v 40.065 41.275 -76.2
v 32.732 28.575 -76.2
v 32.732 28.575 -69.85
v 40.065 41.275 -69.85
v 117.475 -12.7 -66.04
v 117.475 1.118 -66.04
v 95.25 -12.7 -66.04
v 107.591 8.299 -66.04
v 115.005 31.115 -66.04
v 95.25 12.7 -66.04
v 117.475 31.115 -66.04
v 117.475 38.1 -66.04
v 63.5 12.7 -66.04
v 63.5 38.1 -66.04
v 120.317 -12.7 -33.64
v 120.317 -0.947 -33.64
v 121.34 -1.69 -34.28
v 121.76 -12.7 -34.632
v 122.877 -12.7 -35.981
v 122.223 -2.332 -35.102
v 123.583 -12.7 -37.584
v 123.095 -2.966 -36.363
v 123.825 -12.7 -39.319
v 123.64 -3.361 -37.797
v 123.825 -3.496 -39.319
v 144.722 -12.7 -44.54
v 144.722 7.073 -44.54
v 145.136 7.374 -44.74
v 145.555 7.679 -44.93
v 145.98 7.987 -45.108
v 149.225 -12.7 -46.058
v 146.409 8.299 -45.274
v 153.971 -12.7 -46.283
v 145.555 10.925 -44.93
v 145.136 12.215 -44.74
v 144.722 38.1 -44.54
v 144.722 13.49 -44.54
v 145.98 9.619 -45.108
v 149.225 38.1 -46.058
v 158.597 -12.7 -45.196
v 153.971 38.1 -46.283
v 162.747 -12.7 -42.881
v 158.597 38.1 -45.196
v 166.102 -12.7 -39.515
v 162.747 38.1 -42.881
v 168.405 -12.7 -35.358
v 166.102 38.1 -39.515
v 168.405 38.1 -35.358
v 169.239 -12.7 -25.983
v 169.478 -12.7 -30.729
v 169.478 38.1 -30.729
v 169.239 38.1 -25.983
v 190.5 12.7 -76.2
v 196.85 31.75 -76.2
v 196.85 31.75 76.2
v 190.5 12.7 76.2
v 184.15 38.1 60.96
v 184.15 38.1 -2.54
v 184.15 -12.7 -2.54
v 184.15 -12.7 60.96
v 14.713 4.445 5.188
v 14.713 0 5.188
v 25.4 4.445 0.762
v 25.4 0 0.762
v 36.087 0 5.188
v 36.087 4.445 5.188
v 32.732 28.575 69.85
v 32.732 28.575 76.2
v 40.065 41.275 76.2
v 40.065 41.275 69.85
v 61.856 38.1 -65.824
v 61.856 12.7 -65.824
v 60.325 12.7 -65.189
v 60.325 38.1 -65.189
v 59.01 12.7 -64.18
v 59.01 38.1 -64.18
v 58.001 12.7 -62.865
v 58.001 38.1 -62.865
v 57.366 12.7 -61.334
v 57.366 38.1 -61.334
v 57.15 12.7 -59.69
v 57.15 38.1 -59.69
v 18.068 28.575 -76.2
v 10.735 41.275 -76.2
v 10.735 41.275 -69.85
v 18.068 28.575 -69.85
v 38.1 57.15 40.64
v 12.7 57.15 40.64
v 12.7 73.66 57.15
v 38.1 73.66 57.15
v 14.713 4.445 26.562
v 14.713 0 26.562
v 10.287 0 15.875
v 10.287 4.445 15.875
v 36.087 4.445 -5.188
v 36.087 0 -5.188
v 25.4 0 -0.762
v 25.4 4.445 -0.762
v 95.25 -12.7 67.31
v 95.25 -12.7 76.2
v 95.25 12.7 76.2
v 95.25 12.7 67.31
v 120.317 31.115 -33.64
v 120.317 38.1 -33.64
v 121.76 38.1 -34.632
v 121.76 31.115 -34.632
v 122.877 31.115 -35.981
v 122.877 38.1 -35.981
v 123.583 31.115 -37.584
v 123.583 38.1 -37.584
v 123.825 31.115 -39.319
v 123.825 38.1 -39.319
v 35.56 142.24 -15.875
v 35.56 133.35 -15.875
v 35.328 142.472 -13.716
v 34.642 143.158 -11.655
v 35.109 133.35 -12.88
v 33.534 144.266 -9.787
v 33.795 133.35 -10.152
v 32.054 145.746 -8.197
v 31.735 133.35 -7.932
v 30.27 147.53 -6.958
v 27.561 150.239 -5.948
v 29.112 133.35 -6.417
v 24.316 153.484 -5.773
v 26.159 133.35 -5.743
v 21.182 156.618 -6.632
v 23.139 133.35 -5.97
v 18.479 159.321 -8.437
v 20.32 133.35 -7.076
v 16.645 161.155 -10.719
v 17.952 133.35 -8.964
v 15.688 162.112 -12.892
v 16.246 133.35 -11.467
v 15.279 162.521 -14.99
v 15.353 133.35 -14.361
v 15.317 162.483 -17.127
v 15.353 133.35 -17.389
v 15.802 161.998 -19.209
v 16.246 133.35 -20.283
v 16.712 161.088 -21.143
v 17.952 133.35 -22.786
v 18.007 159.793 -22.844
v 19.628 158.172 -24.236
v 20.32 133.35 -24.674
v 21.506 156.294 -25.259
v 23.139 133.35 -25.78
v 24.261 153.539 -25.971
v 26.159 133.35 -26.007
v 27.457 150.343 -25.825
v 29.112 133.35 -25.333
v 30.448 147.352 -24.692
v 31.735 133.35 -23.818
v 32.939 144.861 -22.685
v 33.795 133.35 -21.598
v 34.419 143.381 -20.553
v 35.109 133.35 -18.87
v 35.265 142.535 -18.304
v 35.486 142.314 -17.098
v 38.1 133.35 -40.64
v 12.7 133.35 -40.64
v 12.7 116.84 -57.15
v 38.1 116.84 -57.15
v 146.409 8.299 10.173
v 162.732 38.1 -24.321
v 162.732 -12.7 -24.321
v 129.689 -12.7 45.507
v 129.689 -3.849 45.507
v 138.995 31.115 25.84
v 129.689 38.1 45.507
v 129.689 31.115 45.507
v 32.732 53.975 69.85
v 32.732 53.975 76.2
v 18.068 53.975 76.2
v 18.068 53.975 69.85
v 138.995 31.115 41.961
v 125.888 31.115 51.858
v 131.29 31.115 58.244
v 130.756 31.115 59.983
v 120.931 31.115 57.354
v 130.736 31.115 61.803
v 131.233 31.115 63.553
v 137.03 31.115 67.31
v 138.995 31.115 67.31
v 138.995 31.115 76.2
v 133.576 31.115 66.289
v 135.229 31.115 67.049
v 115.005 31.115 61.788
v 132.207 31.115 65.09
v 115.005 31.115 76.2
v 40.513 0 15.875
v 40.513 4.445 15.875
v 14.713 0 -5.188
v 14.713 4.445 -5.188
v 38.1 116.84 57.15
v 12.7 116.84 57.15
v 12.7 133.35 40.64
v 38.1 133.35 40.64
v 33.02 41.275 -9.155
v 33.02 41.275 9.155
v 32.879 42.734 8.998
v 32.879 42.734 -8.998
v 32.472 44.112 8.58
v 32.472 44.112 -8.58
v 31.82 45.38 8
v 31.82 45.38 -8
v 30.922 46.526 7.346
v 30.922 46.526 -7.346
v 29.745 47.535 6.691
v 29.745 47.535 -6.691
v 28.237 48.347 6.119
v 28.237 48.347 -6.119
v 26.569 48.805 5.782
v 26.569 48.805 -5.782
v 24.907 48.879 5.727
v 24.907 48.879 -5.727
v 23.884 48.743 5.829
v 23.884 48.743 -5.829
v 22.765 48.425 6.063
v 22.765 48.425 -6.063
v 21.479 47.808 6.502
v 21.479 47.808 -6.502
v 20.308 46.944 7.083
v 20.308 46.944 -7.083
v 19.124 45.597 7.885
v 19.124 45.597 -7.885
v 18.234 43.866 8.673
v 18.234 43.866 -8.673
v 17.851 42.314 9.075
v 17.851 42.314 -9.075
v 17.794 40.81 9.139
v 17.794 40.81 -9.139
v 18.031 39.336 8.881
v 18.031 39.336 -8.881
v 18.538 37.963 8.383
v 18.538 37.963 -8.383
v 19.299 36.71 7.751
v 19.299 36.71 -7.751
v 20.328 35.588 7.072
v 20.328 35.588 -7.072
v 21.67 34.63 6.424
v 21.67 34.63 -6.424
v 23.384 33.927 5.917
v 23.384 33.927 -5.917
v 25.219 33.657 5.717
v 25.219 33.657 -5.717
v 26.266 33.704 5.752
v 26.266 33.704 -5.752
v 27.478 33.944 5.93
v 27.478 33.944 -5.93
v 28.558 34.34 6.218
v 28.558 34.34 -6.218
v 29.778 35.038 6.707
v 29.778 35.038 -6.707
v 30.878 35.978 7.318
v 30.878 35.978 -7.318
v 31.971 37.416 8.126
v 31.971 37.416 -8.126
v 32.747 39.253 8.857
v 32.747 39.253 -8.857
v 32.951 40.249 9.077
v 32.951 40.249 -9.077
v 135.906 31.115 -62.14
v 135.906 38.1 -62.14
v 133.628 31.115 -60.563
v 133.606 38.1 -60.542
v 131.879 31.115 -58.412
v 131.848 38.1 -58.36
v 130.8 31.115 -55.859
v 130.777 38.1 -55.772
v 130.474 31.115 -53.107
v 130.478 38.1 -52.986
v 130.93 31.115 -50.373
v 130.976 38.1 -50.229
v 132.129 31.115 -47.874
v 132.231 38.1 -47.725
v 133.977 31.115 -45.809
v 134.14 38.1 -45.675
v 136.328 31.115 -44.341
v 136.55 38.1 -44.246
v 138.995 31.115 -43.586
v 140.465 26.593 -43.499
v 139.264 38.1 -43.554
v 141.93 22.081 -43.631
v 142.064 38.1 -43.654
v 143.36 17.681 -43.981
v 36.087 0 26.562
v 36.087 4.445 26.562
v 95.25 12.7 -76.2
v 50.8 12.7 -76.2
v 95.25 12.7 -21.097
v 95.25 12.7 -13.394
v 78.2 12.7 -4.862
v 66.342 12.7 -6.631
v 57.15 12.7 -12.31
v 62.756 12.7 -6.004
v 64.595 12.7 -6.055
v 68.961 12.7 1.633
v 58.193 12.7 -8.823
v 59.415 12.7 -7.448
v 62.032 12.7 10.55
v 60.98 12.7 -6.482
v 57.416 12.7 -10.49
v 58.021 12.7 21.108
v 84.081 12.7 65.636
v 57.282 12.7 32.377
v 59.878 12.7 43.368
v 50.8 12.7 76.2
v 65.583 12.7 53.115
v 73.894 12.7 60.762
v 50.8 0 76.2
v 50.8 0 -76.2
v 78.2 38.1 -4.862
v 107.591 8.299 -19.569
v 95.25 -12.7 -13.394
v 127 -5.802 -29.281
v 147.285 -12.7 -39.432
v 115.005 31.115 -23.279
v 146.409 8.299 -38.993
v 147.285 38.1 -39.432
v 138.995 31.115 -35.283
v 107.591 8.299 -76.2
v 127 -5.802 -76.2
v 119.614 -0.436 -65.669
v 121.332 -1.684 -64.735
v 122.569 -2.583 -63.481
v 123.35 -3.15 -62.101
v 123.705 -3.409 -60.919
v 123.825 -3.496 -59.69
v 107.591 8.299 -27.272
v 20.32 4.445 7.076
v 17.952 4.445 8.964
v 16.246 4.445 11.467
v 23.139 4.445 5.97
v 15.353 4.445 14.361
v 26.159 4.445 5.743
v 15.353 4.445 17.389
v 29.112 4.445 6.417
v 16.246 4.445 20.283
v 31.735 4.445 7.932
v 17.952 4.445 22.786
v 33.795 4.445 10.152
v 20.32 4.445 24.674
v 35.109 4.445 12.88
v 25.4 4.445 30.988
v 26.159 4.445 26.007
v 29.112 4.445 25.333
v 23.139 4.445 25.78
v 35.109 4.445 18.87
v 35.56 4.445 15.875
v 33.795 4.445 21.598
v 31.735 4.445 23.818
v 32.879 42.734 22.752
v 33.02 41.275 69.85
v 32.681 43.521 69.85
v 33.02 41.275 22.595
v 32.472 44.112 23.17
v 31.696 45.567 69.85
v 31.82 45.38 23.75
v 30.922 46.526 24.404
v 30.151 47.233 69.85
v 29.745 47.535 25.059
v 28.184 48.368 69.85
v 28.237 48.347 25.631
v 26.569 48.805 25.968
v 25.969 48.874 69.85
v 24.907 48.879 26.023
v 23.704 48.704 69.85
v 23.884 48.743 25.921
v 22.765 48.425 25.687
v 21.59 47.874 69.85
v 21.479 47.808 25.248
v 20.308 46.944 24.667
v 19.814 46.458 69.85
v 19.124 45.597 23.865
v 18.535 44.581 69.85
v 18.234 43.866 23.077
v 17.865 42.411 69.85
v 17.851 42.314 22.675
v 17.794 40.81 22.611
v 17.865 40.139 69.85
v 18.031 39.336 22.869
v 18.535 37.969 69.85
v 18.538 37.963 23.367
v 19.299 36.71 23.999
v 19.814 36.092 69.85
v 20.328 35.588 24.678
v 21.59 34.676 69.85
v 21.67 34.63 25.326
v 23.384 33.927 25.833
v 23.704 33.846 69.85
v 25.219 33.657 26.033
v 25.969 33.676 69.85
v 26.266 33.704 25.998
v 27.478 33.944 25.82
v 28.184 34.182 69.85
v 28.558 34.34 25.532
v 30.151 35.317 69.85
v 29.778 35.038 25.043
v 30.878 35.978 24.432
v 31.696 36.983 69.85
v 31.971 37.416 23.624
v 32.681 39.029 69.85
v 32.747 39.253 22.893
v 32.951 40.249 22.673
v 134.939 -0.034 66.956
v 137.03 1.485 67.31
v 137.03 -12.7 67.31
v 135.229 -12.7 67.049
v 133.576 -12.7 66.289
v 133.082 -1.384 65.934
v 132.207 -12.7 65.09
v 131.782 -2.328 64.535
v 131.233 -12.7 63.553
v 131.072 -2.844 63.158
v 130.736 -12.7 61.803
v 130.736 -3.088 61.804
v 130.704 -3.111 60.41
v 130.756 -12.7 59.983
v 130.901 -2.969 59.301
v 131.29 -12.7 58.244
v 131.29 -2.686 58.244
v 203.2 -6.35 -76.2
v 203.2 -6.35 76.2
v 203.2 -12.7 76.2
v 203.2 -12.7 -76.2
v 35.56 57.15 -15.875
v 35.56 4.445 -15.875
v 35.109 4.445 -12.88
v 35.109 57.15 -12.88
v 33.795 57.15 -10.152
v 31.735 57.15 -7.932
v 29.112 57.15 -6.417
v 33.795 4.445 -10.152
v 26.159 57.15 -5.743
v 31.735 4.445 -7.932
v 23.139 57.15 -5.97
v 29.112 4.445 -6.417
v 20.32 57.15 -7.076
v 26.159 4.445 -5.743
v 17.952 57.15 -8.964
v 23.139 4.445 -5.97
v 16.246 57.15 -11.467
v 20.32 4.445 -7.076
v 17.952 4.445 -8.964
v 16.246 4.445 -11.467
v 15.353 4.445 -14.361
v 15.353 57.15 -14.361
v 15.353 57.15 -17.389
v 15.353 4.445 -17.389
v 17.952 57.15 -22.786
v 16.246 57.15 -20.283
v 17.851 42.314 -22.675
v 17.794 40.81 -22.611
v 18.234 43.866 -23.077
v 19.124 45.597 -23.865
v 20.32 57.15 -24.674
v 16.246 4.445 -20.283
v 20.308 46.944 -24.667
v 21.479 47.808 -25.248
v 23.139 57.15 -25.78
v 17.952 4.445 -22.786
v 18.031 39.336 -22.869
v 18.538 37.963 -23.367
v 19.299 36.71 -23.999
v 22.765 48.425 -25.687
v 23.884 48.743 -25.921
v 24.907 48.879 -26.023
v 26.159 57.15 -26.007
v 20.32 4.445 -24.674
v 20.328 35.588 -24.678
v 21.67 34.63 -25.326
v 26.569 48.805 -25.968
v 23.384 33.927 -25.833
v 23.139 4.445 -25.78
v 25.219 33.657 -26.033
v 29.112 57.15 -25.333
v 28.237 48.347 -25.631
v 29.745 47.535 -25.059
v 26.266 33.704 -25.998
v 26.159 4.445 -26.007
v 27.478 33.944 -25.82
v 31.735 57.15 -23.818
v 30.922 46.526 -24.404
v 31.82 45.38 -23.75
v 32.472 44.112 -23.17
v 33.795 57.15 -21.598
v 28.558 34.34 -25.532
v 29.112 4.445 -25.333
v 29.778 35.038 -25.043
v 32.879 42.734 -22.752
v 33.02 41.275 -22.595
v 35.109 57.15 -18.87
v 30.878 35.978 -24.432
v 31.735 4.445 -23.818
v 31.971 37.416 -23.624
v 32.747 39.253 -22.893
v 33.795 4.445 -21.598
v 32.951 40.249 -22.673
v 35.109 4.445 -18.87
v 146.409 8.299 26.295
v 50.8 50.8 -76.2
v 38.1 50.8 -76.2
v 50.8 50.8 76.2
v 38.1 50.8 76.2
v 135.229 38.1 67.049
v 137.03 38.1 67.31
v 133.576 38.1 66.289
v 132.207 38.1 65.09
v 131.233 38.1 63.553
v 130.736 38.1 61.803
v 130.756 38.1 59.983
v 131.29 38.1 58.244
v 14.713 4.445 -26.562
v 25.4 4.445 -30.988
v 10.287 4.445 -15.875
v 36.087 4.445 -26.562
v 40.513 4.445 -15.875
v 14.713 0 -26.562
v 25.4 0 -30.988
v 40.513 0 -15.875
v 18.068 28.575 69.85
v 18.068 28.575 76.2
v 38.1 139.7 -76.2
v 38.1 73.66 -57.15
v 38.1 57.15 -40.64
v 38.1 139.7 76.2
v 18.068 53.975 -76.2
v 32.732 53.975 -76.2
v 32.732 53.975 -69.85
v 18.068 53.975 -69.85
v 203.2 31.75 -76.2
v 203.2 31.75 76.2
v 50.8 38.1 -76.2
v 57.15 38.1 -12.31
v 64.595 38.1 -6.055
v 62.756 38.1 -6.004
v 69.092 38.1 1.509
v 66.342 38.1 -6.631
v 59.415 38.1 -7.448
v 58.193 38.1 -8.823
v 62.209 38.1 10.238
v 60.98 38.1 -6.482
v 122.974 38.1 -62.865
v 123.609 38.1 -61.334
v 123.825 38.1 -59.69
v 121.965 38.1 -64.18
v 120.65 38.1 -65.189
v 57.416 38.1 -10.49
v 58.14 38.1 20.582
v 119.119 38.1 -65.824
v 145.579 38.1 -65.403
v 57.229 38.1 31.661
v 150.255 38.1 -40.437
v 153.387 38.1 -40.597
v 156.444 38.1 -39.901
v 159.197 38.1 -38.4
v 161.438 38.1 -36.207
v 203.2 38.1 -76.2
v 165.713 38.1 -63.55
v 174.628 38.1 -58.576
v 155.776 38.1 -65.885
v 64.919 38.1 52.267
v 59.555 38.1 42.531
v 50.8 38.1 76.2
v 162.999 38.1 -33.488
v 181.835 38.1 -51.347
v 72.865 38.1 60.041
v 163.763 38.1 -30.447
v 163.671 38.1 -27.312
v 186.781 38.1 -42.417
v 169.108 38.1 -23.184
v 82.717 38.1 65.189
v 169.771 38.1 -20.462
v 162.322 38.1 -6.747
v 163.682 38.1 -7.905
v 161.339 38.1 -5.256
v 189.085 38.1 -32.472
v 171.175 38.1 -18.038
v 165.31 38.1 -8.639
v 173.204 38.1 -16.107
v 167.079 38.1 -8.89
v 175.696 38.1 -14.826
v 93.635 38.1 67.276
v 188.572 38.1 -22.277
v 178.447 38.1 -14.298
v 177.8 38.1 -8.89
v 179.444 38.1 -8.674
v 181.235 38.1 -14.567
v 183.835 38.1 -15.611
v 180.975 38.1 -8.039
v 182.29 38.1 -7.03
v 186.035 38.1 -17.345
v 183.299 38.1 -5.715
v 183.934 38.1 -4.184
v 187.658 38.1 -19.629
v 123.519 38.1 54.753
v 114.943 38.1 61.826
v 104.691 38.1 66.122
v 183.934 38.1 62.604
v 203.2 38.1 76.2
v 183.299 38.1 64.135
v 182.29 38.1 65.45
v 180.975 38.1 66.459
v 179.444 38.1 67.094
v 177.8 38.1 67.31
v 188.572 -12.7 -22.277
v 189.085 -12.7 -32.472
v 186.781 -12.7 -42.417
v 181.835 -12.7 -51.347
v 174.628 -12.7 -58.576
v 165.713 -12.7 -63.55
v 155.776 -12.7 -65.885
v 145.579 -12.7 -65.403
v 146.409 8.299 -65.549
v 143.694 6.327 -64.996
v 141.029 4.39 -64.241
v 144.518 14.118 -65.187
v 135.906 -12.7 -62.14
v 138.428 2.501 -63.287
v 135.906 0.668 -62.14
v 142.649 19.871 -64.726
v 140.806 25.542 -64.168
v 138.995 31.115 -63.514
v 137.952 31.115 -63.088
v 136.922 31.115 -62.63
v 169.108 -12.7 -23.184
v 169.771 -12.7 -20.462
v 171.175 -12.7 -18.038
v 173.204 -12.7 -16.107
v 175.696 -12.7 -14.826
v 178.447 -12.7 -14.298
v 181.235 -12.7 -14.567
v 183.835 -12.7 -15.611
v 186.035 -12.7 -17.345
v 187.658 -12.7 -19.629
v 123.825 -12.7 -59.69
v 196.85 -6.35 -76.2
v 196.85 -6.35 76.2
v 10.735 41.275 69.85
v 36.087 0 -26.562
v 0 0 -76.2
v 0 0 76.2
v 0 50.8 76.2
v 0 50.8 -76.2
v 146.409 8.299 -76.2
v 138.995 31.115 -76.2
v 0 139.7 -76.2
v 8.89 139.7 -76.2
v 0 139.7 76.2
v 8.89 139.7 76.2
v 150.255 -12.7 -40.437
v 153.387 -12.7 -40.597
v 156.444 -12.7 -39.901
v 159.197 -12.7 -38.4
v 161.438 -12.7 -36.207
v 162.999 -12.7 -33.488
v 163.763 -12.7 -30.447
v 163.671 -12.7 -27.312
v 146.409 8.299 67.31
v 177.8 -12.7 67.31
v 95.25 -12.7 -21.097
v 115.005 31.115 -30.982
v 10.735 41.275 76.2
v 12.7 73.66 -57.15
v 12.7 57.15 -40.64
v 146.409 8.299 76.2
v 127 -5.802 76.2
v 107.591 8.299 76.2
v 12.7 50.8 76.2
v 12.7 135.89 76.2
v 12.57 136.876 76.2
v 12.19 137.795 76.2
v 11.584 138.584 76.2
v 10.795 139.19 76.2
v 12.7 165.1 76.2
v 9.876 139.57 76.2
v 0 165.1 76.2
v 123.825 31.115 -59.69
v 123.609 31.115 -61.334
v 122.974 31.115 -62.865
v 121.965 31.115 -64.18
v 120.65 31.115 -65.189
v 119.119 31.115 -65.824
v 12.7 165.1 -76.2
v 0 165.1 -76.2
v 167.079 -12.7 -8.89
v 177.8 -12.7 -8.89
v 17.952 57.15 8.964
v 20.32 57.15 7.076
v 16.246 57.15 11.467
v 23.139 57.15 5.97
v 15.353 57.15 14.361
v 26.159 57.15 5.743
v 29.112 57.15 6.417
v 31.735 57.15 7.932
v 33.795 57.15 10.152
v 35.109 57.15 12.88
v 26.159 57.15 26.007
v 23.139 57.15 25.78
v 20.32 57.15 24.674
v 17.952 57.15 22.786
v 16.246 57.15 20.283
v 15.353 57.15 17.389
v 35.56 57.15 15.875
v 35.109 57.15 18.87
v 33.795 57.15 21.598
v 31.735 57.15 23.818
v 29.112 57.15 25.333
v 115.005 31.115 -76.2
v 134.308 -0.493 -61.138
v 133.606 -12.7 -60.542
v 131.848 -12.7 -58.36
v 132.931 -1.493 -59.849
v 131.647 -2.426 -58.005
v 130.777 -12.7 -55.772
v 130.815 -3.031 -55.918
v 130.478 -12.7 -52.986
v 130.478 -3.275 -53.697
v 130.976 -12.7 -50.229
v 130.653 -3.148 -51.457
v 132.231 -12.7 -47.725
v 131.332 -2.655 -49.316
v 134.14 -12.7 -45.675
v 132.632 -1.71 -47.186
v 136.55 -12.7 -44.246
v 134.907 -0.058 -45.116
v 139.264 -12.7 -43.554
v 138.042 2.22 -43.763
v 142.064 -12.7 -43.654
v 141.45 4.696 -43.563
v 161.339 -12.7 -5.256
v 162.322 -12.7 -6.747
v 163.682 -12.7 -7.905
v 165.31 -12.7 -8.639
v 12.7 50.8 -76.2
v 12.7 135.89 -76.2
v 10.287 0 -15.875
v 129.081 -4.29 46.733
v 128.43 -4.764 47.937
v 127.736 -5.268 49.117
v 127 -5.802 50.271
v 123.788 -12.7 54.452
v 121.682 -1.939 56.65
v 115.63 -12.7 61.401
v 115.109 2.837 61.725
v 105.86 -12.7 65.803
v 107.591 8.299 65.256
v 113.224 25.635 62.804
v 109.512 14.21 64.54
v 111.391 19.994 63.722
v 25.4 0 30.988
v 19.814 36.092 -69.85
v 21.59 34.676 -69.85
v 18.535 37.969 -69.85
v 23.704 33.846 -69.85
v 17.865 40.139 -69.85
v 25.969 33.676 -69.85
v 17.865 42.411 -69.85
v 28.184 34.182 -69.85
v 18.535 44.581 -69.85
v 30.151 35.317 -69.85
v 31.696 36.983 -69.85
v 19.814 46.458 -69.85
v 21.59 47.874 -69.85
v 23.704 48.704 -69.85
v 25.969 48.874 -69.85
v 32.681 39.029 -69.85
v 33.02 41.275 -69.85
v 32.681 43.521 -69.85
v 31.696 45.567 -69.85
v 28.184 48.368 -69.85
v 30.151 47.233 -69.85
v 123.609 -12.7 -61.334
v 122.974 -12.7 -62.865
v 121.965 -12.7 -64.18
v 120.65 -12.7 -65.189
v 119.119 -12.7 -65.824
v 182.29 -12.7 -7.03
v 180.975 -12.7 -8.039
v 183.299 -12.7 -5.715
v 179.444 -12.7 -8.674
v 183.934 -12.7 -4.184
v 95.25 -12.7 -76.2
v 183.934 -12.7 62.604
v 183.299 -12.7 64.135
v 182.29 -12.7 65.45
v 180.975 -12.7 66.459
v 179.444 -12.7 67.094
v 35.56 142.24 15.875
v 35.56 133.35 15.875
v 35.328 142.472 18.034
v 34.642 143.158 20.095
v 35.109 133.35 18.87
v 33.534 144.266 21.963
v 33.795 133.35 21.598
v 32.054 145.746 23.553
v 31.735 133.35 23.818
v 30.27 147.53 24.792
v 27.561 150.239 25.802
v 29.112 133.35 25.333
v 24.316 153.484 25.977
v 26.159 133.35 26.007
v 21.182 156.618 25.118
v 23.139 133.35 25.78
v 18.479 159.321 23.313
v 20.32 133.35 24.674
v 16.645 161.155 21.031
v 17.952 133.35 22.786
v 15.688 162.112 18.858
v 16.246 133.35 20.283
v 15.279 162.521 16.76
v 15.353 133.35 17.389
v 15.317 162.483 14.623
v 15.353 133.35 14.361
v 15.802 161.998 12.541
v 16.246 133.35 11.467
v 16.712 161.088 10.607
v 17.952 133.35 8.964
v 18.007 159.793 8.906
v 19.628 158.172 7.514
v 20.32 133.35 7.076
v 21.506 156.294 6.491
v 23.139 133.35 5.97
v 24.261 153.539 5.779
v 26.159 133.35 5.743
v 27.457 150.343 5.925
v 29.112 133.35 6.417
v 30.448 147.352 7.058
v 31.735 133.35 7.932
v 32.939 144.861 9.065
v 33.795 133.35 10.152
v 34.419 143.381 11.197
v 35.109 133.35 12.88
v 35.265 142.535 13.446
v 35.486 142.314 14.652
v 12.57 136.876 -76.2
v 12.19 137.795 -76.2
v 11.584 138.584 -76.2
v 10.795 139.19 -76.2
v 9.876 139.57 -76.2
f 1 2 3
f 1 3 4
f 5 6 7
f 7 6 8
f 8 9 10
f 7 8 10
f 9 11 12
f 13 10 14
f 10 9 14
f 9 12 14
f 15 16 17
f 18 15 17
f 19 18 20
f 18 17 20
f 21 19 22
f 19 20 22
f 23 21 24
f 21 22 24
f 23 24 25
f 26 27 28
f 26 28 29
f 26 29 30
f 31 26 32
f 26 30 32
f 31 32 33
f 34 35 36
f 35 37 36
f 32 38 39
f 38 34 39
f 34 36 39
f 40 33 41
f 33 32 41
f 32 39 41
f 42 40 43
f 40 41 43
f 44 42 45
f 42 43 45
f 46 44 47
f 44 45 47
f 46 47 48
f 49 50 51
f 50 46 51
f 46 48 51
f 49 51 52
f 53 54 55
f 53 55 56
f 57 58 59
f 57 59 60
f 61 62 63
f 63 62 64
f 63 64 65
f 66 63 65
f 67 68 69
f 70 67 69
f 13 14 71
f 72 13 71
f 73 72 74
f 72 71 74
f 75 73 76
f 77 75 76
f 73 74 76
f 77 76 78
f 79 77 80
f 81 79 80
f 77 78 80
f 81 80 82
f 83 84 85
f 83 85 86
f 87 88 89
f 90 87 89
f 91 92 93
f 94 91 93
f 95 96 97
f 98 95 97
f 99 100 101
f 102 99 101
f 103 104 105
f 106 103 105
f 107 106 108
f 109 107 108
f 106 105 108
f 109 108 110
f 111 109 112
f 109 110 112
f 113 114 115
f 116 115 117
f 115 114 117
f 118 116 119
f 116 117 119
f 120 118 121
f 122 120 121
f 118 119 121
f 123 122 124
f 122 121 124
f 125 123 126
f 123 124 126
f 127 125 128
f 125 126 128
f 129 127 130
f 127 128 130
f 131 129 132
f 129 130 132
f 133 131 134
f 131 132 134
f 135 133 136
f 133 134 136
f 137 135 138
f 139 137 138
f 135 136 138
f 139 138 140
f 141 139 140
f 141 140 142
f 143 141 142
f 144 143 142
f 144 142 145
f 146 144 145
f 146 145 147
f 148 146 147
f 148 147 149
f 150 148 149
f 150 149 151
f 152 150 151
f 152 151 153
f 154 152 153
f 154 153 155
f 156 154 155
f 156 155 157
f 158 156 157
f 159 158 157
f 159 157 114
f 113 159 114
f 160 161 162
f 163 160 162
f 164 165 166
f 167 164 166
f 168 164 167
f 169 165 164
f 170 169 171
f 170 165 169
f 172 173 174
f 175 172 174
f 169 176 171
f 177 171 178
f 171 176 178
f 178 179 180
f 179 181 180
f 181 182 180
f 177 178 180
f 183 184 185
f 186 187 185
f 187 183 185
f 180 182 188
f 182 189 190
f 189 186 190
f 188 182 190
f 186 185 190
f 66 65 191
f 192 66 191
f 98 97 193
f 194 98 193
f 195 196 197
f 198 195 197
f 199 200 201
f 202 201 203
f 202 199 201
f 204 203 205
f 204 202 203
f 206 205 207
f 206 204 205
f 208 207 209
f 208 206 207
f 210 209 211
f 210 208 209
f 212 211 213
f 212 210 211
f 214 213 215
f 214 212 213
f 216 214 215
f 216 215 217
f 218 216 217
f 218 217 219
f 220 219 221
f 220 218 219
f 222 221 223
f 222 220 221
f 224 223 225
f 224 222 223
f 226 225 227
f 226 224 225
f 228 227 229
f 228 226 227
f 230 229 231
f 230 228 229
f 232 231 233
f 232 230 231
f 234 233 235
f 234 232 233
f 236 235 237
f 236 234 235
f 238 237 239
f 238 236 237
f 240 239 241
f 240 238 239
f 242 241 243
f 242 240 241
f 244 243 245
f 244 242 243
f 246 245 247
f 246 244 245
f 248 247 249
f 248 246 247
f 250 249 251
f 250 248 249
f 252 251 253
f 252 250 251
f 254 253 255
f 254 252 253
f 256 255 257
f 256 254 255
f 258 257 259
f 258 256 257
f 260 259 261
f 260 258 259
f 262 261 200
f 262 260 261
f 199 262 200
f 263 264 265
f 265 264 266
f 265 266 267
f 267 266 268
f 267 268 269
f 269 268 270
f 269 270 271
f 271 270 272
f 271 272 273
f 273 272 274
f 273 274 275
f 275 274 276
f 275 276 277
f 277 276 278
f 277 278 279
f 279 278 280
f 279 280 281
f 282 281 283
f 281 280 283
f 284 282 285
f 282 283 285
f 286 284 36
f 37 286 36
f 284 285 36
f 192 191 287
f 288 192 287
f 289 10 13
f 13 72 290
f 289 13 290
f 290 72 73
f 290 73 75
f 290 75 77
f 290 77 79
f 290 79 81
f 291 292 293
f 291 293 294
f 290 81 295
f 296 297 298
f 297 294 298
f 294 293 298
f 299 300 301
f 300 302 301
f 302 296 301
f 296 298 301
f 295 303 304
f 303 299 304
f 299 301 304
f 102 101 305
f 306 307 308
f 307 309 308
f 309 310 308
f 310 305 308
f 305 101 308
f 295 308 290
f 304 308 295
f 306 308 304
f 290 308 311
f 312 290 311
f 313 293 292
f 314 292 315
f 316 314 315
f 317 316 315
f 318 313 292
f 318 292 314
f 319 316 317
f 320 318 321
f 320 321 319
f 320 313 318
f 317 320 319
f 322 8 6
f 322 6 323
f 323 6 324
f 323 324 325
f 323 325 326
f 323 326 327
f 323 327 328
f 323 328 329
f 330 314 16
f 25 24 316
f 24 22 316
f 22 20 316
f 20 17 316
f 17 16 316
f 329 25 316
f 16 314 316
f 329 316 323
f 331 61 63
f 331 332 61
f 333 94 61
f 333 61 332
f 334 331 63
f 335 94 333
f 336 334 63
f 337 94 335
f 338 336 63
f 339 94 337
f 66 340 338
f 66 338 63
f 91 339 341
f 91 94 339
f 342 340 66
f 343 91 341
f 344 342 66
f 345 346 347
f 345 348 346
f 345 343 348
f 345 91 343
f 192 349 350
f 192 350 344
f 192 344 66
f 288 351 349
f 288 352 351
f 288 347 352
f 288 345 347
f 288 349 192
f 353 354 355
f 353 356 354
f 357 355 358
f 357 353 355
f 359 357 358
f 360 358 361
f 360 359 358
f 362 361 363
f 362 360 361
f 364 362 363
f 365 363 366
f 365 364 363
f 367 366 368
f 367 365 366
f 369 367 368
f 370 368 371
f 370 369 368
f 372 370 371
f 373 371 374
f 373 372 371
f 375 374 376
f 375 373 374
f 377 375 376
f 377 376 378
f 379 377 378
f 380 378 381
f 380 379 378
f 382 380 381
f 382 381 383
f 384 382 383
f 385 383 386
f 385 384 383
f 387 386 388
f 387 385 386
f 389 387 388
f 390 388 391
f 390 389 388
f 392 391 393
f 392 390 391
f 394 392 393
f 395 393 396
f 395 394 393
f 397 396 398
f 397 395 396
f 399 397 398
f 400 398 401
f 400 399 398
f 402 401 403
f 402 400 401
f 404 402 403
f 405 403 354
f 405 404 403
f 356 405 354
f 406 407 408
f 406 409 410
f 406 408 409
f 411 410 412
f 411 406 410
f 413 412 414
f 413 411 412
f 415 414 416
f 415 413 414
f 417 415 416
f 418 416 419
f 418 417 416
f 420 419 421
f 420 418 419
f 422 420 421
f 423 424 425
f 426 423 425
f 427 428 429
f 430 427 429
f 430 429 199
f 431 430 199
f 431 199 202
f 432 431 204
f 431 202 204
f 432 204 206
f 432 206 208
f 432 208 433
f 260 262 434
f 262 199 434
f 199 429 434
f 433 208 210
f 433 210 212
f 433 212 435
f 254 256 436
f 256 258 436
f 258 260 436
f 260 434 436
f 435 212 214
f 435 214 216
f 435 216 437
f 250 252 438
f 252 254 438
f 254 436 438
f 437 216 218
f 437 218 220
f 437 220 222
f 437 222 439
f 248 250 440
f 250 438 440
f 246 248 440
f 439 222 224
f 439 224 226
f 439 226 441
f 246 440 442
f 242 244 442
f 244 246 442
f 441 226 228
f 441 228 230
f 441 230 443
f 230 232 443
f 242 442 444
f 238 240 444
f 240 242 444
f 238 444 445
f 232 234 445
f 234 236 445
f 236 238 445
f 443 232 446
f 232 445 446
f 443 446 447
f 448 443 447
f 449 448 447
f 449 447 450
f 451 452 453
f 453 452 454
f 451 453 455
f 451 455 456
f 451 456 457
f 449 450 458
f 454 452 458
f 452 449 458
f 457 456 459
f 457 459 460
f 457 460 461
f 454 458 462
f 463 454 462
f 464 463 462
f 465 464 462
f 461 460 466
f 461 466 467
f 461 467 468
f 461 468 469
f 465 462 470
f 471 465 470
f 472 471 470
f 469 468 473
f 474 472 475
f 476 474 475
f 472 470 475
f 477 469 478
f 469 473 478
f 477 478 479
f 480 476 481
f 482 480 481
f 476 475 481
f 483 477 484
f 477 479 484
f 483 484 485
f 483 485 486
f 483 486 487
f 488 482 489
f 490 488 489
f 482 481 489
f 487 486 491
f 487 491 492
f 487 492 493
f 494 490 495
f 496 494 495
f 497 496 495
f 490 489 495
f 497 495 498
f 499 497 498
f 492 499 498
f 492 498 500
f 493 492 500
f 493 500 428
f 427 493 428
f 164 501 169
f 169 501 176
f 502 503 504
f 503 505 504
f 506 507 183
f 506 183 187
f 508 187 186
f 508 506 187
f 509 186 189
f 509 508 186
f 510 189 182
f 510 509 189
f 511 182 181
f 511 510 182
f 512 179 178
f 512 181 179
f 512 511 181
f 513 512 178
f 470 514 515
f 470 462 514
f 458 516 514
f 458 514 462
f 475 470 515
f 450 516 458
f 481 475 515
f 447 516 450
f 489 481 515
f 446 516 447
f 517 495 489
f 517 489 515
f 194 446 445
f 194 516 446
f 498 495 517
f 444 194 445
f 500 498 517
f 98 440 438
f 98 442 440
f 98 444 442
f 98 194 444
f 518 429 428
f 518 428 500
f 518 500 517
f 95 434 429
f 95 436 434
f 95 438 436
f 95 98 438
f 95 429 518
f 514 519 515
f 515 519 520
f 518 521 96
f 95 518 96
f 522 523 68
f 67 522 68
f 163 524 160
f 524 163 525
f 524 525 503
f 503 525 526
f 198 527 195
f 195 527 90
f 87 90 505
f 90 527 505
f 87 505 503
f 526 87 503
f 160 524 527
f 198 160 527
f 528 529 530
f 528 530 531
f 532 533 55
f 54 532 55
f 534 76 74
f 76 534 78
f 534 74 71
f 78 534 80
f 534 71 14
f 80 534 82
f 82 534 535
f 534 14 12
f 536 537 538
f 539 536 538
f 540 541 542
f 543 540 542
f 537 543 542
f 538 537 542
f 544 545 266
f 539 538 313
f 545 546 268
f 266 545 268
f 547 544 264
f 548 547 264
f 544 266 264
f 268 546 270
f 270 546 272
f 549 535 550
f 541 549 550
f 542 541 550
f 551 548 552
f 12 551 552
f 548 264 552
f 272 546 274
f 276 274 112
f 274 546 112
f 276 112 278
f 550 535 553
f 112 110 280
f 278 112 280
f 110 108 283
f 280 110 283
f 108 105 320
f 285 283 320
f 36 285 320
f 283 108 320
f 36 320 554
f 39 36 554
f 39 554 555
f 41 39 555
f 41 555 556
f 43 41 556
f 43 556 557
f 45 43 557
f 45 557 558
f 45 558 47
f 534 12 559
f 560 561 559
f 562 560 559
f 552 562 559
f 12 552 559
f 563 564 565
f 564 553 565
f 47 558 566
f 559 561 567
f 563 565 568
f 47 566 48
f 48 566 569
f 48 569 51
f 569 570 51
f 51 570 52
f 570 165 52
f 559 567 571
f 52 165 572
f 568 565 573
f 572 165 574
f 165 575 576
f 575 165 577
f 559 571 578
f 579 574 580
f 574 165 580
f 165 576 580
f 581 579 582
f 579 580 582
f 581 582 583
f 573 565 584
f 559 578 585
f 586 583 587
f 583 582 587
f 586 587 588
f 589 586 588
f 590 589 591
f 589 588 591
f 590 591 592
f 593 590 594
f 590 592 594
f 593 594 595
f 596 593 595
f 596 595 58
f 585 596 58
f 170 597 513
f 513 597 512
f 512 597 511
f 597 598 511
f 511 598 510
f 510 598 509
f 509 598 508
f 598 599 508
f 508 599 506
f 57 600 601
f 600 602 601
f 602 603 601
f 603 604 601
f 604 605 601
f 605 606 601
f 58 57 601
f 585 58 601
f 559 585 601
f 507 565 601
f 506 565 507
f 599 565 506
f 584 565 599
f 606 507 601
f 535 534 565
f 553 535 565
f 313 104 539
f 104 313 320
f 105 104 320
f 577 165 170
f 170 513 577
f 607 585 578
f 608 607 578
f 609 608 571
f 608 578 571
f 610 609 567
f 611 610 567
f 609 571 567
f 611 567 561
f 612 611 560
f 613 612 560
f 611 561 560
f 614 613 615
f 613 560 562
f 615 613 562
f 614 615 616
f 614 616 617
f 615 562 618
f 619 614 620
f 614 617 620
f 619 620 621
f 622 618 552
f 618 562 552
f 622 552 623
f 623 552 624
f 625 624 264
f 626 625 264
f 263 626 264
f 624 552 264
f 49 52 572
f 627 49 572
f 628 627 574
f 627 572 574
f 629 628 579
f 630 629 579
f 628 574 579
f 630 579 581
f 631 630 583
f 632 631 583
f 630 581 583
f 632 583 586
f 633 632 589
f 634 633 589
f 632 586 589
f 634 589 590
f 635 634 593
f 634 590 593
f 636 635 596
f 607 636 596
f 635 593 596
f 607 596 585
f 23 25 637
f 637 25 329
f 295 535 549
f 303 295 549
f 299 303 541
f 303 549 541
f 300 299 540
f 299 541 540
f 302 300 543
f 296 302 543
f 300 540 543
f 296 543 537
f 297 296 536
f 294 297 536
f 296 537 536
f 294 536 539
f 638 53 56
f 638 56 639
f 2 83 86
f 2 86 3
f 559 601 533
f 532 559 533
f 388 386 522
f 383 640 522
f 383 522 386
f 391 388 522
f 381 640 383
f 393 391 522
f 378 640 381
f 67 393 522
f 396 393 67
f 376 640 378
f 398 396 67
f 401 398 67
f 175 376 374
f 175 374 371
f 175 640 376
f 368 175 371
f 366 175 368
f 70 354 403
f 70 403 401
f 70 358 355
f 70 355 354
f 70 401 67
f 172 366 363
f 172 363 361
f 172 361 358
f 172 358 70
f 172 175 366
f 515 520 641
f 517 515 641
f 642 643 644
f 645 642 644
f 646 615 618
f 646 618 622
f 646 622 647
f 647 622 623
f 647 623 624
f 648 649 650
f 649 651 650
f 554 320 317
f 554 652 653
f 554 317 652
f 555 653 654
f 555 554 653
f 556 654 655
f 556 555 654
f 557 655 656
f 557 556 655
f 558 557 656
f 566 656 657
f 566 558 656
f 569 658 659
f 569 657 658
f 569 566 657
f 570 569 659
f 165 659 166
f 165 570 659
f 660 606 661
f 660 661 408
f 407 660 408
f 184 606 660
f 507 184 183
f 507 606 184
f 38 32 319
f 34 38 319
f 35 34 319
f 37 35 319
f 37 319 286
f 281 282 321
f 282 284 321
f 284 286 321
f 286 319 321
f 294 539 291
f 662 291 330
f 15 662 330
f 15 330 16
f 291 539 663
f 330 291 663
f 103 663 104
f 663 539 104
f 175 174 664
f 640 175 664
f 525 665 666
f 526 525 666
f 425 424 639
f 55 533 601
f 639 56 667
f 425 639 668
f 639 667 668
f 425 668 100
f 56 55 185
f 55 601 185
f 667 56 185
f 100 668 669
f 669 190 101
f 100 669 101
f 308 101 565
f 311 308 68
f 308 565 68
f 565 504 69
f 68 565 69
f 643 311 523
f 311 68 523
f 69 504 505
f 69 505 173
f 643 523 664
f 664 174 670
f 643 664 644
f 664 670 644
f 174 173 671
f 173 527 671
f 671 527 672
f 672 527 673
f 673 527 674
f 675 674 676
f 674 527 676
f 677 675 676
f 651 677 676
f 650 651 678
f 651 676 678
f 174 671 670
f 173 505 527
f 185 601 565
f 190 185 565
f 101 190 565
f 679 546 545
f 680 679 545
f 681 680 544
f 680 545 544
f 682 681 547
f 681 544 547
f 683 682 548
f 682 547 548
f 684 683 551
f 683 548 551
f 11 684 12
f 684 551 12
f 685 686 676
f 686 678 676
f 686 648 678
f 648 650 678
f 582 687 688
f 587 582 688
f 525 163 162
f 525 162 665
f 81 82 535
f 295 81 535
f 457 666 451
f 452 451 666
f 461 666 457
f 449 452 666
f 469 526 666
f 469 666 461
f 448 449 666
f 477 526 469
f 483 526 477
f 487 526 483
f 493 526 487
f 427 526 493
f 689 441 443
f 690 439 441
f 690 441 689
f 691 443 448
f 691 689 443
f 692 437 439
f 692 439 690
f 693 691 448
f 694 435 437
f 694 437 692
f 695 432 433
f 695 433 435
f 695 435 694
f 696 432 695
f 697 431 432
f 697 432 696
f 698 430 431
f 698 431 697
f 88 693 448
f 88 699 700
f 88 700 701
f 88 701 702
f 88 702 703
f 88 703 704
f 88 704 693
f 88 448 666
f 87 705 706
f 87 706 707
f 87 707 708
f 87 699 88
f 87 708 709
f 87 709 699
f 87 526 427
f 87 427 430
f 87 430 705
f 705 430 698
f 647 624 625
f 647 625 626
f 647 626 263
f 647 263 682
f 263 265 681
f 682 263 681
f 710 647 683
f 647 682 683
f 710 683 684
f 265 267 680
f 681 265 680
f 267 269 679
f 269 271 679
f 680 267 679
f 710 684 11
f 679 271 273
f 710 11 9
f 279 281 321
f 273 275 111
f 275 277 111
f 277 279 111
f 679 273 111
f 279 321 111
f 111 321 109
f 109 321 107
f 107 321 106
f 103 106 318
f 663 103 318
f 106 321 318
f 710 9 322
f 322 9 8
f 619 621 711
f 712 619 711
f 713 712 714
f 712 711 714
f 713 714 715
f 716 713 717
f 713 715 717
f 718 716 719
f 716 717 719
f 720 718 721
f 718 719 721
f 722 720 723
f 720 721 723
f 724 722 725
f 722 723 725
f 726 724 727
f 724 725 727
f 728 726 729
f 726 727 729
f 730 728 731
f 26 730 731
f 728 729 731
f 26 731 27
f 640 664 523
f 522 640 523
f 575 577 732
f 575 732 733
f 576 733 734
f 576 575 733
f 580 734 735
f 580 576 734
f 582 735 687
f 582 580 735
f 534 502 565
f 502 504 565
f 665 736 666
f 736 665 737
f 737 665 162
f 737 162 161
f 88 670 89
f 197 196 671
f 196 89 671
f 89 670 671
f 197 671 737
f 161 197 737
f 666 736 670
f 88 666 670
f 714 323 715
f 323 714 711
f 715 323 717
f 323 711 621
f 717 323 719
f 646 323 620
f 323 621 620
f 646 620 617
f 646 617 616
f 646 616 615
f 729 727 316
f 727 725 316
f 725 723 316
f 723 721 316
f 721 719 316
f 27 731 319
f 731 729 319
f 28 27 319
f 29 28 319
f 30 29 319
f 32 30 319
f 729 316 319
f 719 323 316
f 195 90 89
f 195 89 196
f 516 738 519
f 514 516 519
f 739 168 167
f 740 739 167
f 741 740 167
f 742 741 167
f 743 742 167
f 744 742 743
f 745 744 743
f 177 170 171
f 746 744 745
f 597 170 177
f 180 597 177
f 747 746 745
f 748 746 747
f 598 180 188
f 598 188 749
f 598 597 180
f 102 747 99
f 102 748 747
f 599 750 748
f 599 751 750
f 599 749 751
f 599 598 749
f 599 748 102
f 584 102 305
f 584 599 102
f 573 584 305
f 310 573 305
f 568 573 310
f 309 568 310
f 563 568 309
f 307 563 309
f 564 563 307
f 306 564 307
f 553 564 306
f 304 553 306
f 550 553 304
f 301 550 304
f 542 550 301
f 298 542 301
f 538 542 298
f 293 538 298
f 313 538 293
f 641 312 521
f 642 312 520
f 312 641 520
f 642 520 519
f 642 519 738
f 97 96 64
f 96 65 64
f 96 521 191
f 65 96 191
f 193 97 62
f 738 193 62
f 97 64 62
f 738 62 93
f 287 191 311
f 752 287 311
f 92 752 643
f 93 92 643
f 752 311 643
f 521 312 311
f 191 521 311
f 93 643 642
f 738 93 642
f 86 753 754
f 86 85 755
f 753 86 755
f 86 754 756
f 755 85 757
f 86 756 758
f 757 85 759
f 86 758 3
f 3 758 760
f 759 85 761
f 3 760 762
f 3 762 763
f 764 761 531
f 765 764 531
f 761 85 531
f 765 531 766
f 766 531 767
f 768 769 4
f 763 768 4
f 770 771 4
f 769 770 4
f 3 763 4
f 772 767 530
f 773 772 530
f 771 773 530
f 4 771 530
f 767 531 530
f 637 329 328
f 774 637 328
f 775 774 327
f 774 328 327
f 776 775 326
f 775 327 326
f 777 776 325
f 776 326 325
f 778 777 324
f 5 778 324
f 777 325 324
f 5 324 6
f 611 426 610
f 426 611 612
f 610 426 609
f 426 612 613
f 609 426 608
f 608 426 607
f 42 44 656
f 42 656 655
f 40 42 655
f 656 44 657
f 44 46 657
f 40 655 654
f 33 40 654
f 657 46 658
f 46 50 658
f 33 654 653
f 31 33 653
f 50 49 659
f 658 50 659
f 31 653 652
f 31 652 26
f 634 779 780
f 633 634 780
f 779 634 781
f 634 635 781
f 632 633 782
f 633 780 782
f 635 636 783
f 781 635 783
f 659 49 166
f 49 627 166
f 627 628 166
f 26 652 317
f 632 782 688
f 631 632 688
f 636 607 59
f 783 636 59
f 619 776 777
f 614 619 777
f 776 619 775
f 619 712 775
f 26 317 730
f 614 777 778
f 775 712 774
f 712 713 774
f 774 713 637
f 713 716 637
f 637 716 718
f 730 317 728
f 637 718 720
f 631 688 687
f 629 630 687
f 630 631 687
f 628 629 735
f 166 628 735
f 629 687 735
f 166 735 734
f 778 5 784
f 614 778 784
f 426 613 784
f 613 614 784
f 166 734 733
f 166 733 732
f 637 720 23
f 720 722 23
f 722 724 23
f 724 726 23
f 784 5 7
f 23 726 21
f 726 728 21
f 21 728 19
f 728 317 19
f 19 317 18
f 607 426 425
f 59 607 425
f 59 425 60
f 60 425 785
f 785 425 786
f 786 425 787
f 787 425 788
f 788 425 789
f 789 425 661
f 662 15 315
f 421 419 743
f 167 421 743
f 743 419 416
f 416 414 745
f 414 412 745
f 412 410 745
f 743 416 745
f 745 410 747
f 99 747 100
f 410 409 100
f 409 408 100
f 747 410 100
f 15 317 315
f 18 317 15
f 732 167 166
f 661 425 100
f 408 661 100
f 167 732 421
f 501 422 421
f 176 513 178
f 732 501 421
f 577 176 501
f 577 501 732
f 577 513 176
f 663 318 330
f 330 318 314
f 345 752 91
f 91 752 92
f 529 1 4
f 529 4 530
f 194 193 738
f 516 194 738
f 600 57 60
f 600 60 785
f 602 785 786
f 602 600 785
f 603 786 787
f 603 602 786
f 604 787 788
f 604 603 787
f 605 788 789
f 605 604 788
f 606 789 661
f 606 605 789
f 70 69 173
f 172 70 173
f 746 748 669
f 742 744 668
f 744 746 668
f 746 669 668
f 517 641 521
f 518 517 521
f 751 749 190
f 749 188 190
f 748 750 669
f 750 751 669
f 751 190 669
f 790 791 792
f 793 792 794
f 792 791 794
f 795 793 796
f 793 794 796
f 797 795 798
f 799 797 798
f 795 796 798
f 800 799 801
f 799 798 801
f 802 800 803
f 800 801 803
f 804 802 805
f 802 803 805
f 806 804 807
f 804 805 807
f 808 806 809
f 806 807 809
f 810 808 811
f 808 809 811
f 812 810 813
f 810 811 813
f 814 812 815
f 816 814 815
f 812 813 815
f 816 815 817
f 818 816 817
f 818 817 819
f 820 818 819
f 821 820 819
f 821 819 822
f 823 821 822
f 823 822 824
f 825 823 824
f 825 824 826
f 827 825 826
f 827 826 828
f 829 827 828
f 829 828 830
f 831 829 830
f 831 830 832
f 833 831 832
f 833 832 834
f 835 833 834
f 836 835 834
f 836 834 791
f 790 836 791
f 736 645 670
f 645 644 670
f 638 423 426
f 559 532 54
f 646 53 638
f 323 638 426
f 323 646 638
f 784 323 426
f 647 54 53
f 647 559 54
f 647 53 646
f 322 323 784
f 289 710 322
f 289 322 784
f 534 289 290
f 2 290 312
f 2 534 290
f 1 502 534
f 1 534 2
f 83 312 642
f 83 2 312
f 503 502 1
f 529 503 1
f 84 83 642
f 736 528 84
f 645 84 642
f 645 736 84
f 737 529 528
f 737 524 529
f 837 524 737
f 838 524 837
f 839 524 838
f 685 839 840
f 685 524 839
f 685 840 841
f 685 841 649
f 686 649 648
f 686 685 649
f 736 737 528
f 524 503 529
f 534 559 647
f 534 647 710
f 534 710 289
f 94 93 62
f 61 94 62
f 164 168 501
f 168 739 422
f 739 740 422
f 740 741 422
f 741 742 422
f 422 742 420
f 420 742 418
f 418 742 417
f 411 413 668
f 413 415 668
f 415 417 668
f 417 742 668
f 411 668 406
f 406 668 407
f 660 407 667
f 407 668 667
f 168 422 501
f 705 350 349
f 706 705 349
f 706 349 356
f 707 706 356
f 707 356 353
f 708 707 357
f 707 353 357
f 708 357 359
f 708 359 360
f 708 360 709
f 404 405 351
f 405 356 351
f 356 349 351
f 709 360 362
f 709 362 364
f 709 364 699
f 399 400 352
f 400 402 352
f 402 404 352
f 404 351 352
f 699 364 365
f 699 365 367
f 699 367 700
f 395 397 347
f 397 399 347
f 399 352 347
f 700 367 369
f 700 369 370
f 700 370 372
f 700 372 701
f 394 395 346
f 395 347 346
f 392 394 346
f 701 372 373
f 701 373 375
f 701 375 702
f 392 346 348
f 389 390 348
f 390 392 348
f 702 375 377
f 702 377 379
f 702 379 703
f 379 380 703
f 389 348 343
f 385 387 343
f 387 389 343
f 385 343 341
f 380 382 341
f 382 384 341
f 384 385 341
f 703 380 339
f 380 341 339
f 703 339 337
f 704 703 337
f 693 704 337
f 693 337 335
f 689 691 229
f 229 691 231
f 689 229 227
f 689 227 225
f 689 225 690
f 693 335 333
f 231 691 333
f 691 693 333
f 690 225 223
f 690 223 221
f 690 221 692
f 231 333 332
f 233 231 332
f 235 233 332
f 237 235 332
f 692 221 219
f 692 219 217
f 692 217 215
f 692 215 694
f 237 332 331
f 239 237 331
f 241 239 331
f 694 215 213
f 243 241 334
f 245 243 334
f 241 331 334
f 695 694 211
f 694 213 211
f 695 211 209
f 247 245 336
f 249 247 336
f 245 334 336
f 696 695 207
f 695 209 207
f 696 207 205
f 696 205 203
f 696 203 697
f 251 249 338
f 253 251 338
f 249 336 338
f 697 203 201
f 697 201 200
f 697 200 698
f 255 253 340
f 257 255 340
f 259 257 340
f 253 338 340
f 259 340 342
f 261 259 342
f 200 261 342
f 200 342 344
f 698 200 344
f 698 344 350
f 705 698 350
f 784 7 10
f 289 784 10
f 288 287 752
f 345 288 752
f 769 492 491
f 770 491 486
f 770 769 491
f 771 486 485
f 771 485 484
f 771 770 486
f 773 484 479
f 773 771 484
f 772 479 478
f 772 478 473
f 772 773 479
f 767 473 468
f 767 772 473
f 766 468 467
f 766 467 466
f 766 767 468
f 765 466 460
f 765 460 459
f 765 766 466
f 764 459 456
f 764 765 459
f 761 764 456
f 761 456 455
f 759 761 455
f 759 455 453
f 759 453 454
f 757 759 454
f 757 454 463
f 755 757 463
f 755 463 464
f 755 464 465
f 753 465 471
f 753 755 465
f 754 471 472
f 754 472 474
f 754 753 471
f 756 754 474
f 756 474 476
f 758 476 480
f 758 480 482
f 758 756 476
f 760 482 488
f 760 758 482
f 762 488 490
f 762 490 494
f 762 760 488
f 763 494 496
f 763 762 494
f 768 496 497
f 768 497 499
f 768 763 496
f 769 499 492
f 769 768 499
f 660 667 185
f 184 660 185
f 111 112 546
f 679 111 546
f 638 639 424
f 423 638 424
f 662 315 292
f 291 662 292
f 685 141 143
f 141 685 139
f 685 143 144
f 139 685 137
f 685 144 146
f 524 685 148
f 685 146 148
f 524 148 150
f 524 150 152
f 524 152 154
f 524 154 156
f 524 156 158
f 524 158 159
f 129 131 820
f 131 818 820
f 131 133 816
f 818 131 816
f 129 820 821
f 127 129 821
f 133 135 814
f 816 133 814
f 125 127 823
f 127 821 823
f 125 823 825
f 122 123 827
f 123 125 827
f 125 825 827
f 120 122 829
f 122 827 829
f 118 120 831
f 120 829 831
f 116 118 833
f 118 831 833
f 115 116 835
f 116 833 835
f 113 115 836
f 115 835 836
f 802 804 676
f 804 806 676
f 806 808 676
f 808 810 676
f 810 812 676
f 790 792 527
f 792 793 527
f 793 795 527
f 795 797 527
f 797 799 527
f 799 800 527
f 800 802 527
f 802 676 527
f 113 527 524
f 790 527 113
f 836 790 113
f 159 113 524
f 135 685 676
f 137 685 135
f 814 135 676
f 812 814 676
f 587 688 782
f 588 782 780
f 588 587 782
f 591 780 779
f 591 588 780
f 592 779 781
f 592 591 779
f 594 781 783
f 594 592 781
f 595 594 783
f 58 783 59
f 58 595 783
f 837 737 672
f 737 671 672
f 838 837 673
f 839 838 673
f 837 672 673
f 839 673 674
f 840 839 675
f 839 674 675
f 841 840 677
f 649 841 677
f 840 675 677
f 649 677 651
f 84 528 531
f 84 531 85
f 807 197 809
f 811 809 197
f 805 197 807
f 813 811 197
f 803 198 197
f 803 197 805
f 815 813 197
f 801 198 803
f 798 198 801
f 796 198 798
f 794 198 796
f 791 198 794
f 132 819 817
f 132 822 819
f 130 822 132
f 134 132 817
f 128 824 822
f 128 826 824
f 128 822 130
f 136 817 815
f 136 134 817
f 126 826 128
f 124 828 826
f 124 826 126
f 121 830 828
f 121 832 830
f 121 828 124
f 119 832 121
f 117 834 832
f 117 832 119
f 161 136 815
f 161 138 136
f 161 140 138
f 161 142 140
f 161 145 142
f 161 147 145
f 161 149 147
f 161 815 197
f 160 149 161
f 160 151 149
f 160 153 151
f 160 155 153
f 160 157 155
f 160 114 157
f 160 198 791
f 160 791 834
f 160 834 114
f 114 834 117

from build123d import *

# Parameters (mm, degrees)
SKETCH1_R           = 7.62
BOSS_EXTRUDE1_DEPTH = 76.2
CUT_EXTRUDE1_DEPTH  = 51.8
CUT_EXTRUDE2_DEPTH  = 39.1
SKETCH4_R           = 10.16
CUT_EXTRUDE3_DEPTH  = 166.1
CUT_EXTRUDE4_DEPTH  = 4.445
CUT_EXTRUDE5_DEPTH  = 6.35


with BuildPart() as part:
    # Sketch1 → Boss-Extrude1 (new body, symmetric)
    with BuildSketch(Plane.XY):
        with BuildLine():
            Line((0, 0), (0, 50.8))
            Line((0, 50.8), (12.7, 50.8))
            Line((12.7, 50.8), (12.7, 135.89))
            ThreePointArc((12.7, 135.89), (11.584076836, 138.584076836), (8.89, 139.7))
            Line((8.89, 139.7), (0, 139.7))
            Line((0, 139.7), (0, 165.1))
            Line((0, 165.1), (12.7, 165.1))
            Line((12.7, 165.1), (38.1, 139.7))
            Line((38.1, 139.7), (38.1, 50.8))
            Line((38.1, 50.8), (50.8, 50.8))
            Line((50.8, 50.8), (50.8, 38.1))
            Line((50.8, 38.1), (203.2, 38.1))
            Line((203.2, 38.1), (203.2, 31.75))
            Line((203.2, 31.75), (196.85, 31.75))
            Line((196.85, 31.75), (190.5, 12.7))
            Line((190.5, 12.7), (196.85, -6.35))
            Line((196.85, -6.35), (203.2, -6.35))
            Line((203.2, -6.35), (203.2, -12.7))
            Line((203.2, -12.7), (95.25, -12.7))
            Line((95.25, -12.7), (95.25, 12.7))
            Line((95.25, 12.7), (50.8, 12.7))
            Line((50.8, 12.7), (50.8, 0))
            Line((50.8, 0), (0, 0))
        make_face()
        with Locations((25.4, 41.275)):
            Circle(SKETCH1_R, mode=Mode.SUBTRACT)
        Polygon((146.408669031, 8.298741154), (138.995217137, 31.115), (115.004782863, 31.115), (107.591330969, 8.298741154), (127, -5.802482309), align=None, mode=Mode.SUBTRACT)
    extrude(amount=BOSS_EXTRUDE1_DEPTH, both=True)

    # Sketch2 → Cut-Extrude1 (cut, through all)
    with BuildSketch(Plane(origin=(0, 38.1, 0), x_dir=(1, 0, 0), z_dir=(0, 1, 0))):
        with BuildLine():
            Line((57.15, 59.69), (57.15, 12.310112434))
            ThreePointArc((57.15, 12.310112434), (60.162452878, 6.907957382), (66.341584002, 6.631388955))
            Line((66.341584002, 6.631388955), (120.316584002, 33.640011057))
            ThreePointArc((120.316584002, 33.640011057), (122.877155052, 35.981187414), (123.825, 39.318734537))
            Line((123.825, 39.318734537), (123.825, 59.69))
            ThreePointArc((123.825, 59.69), (121.965128061, 64.180128061), (117.475, 66.04))
            Line((117.475, 66.04), (63.5, 66.04))
            ThreePointArc((63.5, 66.04), (59.009871939, 64.180128061), (57.15, 59.69))
        make_face()
        with BuildLine():
            Line((78.20049599, 4.862340879), (147.285148797, 39.431702264))
            ThreePointArc((147.285148797, 39.431702264), (160.392932197, 37.380552912), (162.731634589, 24.321009641))
            Line((162.731634589, 24.321009641), (129.688781962, -45.506634528))
            ThreePointArc((129.688781962, -45.506634528), (68.606892677, -56.445176375), (78.20049599, 4.862340879))
        make_face()
        with BuildLine():
            Line((131.290134658, -58.243894245), (161.338708783, 5.256105755))
            ThreePointArc((161.338708783, 5.256105755), (163.681799397, 7.905154776), (167.078505776, 8.89))
            Line((167.078505776, 8.89), (177.8, 8.89))
            ThreePointArc((177.8, 8.89), (182.290128061, 7.030128061), (184.15, 2.54))
            Line((184.15, 2.54), (184.15, -60.96))
            ThreePointArc((184.15, -60.96), (182.290128061, -65.450128061), (177.8, -67.31))
            Line((177.8, -67.31), (137.029931652, -67.31))
            ThreePointArc((137.029931652, -67.31), (131.664776876, -64.35670638), (131.290134658, -58.243894245))
        make_face()
        with BuildLine():
            ThreePointArc((188.57162547, 22.277294118), (174.627718402, 58.576263546), (135.906341971, 62.140352941))
            ThreePointArc((135.906341971, 62.140352941), (131.513776952, 48.932212079), (144.721917814, 44.539647059))
            ThreePointArc((144.721917814, 44.539647059), (162.747386153, 42.880501996), (169.238515305, 25.982705882))
            ThreePointArc((169.238515305, 25.982705882), (177.052364505, 14.463444917), (188.57162547, 22.277294118))
        make_face()
    extrude(amount=-CUT_EXTRUDE1_DEPTH, mode=Mode.SUBTRACT)

    # Sketch3 → Cut-Extrude2 (cut, through all)
    with BuildSketch(Plane(origin=(38.1, 0, 0), x_dir=(0, 0, -1), z_dir=(1, 0, 0))):
        Polygon((-40.64, 133.35), (40.64, 133.35), (57.15, 116.84), (57.15, 73.66), (40.64, 57.15), (-40.64, 57.15), (-57.15, 73.66), (-57.15, 116.84), align=None)
    extrude(amount=-CUT_EXTRUDE2_DEPTH, mode=Mode.SUBTRACT)

    # Sketch4 → Cut-Extrude3 (cut, through all)
    with BuildSketch(Plane.XZ):
        with Locations((25.4, 15.875)):
            Circle(SKETCH4_R)
        with Locations((25.4, -15.875)):
            Circle(SKETCH4_R)
    extrude(amount=-CUT_EXTRUDE3_DEPTH, mode=Mode.SUBTRACT)

    # Sketch6 → Cut-Extrude4 (cut)
    with BuildSketch(Plane.XZ):
        Polygon((25.4, 0.762), (36.086504784, 5.188495216), (40.513, 15.875), (36.086504784, 26.561504784), (25.4, 30.988), (14.713495216, 26.561504784), (10.287, 15.875), (14.713495216, 5.188495216), align=None)
        Polygon((25.4, -30.988), (36.086504784, -26.561504784), (40.513, -15.875), (36.086504784, -5.188495216), (25.4, -0.762), (14.713495216, -5.188495216), (10.287, -15.875), (14.713495216, -26.561504784), align=None)
    extrude(amount=-CUT_EXTRUDE4_DEPTH, mode=Mode.SUBTRACT)

    # Sketch7 → Cut-Extrude5 (cut)
    with BuildSketch(Plane.XY.offset(76.2)):
        Polygon((40.064696837, 41.275), (32.732348419, 53.975), (18.067651581, 53.975), (10.735303163, 41.275), (18.067651581, 28.575), (32.732348419, 28.575), align=None)
    cut_extrude5 = extrude(amount=-CUT_EXTRUDE5_DEPTH, mode=Mode.SUBTRACT)

    # Mirror1: Cut-Extrude5 across plane
    add(cut_extrude5.mirror(Plane.XY), mode=Mode.SUBTRACT)


solid = part.part
